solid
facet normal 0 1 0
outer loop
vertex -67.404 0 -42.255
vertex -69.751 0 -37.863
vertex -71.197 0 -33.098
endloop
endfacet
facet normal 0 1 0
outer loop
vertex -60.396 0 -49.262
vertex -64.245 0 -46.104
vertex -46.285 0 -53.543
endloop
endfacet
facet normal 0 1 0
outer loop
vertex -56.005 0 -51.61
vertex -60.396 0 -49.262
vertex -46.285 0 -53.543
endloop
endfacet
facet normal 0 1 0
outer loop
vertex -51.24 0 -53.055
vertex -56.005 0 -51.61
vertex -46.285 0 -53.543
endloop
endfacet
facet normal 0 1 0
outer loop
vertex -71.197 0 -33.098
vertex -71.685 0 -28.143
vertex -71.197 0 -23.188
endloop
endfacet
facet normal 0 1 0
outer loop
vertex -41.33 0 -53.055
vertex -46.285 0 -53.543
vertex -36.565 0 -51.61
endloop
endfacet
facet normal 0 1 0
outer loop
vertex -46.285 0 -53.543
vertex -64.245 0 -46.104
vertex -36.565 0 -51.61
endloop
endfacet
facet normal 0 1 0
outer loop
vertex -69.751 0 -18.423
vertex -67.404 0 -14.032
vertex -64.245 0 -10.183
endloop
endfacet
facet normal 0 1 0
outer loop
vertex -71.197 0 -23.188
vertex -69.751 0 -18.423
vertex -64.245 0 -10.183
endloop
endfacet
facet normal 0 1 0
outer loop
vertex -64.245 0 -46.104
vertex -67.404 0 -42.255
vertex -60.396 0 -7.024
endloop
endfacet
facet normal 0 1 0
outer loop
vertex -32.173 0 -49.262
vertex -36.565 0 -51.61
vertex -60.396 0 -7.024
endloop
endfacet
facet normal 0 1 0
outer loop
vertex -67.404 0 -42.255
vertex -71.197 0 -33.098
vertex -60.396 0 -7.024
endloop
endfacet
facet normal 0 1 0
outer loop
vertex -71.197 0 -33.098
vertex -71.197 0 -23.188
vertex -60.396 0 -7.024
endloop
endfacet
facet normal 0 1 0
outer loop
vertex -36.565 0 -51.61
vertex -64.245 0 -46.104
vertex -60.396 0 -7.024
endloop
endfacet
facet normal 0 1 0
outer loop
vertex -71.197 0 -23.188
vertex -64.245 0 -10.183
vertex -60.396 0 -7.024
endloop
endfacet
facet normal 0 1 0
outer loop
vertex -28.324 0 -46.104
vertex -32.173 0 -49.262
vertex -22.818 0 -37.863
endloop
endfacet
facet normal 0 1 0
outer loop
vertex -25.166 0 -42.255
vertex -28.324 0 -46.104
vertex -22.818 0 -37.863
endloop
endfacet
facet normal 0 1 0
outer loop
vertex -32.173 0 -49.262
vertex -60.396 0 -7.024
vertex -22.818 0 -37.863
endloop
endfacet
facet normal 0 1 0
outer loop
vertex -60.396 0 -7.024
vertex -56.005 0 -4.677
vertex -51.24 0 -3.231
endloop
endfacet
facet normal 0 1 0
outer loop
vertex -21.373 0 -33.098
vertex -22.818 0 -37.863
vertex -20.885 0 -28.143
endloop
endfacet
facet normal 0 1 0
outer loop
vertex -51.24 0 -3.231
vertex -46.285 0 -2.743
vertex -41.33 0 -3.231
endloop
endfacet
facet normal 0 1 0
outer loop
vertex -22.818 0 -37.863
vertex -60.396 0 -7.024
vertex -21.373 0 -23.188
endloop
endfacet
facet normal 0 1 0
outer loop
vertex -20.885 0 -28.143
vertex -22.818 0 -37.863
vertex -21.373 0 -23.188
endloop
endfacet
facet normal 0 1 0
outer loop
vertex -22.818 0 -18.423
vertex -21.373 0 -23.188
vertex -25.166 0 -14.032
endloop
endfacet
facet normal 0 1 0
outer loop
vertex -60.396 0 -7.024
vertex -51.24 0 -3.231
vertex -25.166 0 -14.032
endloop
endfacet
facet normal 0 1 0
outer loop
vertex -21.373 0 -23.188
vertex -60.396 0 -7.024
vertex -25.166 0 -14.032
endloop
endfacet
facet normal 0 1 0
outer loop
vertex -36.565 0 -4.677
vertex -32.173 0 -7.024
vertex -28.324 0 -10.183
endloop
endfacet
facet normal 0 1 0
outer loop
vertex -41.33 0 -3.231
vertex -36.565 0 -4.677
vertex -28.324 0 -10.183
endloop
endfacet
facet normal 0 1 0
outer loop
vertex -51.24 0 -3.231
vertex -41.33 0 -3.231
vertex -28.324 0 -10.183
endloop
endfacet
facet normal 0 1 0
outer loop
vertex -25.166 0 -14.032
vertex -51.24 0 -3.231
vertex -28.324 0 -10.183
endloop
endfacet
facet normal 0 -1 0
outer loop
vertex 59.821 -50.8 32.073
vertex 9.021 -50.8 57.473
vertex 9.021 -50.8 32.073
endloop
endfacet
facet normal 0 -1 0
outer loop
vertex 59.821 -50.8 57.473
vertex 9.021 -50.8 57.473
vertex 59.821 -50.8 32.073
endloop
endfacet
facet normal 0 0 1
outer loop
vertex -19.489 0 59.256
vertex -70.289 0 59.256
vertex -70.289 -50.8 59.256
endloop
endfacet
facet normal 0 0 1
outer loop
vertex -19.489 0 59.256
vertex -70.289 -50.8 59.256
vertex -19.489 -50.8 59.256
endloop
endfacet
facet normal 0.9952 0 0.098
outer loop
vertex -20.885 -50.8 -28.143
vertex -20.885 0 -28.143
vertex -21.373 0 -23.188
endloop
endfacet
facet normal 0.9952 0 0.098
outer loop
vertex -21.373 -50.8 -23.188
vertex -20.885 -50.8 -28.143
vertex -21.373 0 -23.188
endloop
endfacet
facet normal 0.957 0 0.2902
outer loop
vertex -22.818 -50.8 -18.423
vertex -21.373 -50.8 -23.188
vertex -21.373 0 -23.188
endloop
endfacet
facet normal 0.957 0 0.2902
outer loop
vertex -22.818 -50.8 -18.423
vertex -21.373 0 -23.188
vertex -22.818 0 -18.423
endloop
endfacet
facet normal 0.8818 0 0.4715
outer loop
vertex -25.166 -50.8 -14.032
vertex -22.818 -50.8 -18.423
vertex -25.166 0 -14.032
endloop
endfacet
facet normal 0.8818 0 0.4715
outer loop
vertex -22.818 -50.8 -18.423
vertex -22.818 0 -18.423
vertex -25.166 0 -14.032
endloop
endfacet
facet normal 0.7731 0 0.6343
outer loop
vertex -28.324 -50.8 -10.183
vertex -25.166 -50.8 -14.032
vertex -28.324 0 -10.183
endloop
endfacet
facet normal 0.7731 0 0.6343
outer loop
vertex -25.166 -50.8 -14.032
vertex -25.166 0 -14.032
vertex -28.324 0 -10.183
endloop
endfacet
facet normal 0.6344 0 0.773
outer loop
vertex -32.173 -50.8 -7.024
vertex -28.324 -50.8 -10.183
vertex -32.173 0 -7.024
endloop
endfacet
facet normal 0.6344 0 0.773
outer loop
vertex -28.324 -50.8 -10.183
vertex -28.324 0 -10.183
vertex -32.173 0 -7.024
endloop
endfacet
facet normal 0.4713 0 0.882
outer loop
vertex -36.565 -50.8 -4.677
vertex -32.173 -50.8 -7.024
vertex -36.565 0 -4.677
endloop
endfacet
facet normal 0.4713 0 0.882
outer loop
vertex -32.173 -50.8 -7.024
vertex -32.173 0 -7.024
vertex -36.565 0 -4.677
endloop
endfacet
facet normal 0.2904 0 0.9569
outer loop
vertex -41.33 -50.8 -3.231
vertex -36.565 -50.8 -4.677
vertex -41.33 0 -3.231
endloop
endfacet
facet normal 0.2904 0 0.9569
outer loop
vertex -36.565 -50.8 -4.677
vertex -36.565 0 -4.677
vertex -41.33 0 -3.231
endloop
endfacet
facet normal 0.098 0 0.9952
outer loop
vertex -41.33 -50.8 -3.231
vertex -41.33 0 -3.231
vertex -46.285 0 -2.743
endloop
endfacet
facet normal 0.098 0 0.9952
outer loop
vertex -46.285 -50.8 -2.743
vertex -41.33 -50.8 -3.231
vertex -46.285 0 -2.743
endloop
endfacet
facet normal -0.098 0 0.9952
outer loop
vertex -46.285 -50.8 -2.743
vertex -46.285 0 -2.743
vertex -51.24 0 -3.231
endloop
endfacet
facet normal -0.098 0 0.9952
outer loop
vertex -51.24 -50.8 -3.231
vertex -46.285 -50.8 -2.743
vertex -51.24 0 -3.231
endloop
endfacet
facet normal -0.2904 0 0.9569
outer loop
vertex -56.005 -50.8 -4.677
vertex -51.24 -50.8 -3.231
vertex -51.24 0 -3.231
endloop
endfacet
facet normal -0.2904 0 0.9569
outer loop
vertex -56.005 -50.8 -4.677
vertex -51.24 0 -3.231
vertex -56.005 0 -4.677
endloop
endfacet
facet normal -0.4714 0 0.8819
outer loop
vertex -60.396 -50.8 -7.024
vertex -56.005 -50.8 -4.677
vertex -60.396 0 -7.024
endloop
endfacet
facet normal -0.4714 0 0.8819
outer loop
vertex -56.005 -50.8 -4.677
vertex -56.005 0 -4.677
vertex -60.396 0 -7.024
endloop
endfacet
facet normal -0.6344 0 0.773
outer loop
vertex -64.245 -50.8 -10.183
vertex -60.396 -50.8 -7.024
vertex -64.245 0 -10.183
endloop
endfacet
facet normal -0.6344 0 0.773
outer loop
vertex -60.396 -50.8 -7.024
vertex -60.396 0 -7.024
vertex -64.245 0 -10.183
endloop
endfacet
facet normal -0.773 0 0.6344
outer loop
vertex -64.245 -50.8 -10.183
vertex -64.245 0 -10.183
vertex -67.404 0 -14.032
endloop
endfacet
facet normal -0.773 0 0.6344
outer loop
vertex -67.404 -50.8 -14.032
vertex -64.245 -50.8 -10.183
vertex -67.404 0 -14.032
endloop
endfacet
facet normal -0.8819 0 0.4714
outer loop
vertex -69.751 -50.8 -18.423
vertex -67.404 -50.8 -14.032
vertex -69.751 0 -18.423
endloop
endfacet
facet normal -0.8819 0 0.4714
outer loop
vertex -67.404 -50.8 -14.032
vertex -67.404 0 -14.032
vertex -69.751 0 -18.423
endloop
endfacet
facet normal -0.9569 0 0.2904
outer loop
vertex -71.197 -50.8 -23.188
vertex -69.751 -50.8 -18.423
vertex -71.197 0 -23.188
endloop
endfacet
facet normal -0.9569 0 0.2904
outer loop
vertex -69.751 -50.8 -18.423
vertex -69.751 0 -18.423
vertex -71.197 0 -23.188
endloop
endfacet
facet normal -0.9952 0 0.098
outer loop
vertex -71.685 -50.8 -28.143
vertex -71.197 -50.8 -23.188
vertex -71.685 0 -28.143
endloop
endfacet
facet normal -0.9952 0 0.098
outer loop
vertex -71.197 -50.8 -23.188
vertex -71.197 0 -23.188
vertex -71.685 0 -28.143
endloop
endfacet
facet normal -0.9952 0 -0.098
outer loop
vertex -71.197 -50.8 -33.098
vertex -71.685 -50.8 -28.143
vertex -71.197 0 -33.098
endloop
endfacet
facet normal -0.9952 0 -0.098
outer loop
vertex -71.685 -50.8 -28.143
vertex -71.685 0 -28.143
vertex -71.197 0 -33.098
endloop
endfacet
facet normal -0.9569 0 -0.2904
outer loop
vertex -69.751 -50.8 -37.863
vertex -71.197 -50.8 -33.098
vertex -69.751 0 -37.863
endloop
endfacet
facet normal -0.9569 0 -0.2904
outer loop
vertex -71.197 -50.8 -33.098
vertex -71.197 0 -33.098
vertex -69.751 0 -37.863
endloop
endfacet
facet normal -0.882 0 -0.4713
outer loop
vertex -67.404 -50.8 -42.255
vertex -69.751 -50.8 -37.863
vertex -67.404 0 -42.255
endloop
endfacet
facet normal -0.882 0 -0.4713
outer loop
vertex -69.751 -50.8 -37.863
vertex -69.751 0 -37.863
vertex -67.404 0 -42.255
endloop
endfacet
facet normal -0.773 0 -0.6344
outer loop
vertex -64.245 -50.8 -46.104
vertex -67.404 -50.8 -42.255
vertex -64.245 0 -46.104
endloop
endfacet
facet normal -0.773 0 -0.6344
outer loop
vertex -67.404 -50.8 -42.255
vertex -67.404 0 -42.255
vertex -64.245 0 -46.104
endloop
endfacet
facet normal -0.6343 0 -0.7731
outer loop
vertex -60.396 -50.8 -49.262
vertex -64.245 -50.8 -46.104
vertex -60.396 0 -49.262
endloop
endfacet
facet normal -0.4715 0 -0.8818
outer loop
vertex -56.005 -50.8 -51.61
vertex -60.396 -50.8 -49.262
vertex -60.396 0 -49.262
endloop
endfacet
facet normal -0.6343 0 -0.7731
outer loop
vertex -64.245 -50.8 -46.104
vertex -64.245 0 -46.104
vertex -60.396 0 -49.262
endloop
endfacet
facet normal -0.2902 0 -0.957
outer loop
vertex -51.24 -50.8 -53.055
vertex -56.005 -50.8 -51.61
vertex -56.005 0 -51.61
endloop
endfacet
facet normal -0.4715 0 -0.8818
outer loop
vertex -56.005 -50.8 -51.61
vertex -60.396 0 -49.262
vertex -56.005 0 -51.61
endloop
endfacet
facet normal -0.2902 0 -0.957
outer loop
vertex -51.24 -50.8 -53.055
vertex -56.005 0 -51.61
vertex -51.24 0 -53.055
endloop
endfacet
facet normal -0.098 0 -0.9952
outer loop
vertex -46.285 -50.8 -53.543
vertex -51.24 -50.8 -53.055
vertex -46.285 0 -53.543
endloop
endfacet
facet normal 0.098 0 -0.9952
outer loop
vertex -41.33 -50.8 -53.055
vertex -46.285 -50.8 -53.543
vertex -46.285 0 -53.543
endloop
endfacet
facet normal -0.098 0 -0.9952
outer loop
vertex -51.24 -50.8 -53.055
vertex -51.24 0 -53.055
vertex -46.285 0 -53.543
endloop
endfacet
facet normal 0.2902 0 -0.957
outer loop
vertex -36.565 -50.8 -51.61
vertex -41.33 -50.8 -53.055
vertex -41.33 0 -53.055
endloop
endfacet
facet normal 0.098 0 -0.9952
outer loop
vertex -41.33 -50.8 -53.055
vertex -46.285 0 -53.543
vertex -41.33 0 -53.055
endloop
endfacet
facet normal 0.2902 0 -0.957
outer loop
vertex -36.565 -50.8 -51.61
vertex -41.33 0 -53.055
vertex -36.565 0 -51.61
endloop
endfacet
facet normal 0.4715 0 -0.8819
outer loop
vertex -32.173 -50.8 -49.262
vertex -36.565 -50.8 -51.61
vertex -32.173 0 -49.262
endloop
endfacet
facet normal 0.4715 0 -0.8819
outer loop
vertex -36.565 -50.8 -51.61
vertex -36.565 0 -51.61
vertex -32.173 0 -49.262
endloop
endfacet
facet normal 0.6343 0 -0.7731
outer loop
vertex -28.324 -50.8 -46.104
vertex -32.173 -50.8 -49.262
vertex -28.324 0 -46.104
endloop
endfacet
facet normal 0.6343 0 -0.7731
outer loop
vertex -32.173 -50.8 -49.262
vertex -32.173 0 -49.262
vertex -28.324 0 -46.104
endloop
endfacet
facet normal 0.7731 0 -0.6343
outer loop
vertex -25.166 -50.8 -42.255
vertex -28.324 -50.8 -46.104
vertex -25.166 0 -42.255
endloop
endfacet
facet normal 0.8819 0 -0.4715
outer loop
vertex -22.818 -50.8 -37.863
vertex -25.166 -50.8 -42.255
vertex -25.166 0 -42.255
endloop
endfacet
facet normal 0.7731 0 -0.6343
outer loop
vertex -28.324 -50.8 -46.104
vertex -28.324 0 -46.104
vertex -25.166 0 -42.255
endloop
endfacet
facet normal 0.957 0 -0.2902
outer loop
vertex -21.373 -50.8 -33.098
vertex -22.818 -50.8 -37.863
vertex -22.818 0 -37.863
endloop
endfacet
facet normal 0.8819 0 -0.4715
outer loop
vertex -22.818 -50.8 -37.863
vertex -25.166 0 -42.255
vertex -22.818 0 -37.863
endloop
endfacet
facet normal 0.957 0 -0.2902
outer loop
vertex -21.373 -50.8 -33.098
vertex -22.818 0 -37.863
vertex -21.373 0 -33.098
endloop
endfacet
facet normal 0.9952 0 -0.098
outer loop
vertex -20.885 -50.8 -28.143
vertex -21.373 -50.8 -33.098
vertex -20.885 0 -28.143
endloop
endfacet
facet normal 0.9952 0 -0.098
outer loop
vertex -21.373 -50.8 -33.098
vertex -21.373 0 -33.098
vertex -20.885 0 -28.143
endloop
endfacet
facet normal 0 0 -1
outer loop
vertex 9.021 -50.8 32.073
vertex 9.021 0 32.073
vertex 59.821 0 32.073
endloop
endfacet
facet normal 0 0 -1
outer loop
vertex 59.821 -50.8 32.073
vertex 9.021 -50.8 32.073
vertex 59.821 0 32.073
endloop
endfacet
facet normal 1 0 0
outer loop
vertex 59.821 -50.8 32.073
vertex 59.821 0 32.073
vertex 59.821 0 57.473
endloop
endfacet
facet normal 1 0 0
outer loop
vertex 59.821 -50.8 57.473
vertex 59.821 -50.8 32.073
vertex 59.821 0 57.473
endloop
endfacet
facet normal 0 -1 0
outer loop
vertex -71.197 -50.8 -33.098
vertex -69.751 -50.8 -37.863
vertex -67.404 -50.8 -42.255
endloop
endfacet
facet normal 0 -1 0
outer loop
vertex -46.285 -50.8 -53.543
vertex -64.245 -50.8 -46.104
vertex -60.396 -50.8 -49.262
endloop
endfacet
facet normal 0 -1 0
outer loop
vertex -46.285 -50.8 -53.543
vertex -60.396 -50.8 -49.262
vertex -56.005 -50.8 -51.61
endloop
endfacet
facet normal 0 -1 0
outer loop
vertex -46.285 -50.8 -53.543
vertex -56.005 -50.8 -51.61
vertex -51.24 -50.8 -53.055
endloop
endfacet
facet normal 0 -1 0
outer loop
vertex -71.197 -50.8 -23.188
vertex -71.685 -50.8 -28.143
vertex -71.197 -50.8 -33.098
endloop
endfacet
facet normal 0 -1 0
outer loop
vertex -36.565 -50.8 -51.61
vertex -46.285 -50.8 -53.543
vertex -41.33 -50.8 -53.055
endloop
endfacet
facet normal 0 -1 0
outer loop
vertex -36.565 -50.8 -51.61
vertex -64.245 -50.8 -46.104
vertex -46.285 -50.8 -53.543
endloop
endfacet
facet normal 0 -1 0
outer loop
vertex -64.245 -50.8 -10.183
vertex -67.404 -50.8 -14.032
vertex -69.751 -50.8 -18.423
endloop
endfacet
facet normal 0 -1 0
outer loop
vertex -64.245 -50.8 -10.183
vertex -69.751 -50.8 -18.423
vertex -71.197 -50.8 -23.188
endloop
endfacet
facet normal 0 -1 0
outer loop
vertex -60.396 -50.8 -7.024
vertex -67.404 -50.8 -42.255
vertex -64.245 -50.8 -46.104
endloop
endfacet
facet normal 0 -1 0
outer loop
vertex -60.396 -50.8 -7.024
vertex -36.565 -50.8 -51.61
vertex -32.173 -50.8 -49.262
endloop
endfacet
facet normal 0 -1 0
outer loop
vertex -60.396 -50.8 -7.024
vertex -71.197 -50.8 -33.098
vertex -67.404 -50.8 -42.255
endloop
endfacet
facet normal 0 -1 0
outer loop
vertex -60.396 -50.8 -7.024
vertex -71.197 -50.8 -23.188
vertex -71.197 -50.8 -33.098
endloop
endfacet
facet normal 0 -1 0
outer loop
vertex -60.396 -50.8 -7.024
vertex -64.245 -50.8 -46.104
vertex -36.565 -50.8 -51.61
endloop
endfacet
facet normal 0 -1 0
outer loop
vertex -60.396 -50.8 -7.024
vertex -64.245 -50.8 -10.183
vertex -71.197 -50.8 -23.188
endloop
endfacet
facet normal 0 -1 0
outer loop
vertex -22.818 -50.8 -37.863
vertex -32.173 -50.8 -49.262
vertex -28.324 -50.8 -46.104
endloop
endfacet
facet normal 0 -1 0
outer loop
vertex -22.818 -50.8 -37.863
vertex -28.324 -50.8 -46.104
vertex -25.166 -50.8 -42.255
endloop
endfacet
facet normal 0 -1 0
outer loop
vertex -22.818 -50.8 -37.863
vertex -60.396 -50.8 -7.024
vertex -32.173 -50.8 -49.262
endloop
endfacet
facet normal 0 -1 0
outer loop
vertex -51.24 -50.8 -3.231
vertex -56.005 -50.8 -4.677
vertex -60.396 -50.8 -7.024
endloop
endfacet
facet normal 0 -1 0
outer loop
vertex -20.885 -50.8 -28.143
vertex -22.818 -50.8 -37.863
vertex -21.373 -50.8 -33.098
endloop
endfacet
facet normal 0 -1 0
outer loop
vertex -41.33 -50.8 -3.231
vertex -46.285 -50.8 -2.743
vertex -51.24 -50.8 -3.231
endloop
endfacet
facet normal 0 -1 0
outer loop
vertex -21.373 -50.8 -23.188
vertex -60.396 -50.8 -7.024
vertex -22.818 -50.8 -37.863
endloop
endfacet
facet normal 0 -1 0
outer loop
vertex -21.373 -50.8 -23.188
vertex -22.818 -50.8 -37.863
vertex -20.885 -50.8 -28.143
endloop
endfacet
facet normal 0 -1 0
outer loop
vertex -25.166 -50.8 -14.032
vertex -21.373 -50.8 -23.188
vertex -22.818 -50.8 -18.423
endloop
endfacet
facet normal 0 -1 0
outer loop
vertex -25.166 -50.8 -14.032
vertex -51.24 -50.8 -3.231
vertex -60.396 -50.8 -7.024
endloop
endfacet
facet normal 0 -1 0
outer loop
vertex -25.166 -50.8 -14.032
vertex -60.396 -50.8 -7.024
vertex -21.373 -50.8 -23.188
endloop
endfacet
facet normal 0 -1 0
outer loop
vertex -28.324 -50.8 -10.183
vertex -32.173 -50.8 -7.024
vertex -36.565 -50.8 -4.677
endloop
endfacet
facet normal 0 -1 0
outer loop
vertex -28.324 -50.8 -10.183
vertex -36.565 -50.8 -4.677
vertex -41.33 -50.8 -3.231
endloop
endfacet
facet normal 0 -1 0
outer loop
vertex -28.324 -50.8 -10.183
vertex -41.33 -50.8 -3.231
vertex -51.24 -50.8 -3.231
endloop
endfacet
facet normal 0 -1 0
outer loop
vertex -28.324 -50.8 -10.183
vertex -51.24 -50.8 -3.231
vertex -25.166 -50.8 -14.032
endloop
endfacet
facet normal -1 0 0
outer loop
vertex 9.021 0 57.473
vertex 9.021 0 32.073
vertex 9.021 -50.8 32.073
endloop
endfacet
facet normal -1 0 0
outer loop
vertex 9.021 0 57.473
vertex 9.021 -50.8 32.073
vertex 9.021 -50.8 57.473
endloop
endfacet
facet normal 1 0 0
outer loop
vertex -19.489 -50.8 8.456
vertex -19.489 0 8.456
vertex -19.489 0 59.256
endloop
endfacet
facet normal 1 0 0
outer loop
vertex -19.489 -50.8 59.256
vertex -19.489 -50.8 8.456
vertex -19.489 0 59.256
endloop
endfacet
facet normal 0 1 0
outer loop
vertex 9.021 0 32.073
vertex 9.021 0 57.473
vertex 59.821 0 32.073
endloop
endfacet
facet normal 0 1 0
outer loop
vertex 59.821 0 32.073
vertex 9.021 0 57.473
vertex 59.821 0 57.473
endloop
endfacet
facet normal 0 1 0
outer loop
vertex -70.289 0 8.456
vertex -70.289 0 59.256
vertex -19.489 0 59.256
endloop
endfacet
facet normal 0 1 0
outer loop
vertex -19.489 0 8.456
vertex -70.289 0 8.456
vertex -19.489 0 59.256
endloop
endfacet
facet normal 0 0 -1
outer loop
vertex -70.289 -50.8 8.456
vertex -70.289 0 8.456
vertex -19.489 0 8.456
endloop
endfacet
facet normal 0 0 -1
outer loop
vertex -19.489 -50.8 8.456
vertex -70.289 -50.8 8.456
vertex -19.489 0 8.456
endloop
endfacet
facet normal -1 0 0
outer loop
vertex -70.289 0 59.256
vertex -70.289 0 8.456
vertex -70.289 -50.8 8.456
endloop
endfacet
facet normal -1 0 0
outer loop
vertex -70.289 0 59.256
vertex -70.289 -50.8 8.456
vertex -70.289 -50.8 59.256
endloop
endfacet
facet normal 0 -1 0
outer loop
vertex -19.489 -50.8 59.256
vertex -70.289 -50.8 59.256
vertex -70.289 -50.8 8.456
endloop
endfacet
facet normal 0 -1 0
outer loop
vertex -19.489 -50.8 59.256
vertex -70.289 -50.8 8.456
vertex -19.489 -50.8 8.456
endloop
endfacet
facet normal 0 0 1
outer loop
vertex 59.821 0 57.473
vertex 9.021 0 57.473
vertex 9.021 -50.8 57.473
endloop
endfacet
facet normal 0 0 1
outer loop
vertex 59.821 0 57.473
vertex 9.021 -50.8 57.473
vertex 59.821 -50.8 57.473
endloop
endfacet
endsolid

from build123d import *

# Parameters (mm, degrees)
F0_W     = 50.8
F0_H     = 50.8
F3_DEPTH = 50.8
F1_W     = 50.8
F1_H     = 25.4
F4_DEPTH = 50.8
F2_R     = 25.4
F5_DEPTH = 50.8


with BuildPart() as f3:
    # F0 (on Front) → F3 (new body)
    with BuildSketch(Plane.XZ):
        with Locations((-44.889332, 33.856223)):
            Rectangle(F0_W, F0_H)
    extrude(amount=F3_DEPTH)


with BuildPart() as f4:
    # F1 (on Front) → F4 (new body)
    with BuildSketch(Plane.XZ):
        with Locations((34.420673, 44.773038)):
            Rectangle(F1_W, F1_H)
    extrude(amount=F4_DEPTH)


with BuildPart() as f5:
    # F2 (on Front) → F5 (new body)
    with BuildSketch(Plane.XZ):
        with Locations((-46.284854, -28.143052)):
            Circle(F2_R)
    extrude(amount=F5_DEPTH)


solid = Compound([f3.part, f4.part, f5.part])
